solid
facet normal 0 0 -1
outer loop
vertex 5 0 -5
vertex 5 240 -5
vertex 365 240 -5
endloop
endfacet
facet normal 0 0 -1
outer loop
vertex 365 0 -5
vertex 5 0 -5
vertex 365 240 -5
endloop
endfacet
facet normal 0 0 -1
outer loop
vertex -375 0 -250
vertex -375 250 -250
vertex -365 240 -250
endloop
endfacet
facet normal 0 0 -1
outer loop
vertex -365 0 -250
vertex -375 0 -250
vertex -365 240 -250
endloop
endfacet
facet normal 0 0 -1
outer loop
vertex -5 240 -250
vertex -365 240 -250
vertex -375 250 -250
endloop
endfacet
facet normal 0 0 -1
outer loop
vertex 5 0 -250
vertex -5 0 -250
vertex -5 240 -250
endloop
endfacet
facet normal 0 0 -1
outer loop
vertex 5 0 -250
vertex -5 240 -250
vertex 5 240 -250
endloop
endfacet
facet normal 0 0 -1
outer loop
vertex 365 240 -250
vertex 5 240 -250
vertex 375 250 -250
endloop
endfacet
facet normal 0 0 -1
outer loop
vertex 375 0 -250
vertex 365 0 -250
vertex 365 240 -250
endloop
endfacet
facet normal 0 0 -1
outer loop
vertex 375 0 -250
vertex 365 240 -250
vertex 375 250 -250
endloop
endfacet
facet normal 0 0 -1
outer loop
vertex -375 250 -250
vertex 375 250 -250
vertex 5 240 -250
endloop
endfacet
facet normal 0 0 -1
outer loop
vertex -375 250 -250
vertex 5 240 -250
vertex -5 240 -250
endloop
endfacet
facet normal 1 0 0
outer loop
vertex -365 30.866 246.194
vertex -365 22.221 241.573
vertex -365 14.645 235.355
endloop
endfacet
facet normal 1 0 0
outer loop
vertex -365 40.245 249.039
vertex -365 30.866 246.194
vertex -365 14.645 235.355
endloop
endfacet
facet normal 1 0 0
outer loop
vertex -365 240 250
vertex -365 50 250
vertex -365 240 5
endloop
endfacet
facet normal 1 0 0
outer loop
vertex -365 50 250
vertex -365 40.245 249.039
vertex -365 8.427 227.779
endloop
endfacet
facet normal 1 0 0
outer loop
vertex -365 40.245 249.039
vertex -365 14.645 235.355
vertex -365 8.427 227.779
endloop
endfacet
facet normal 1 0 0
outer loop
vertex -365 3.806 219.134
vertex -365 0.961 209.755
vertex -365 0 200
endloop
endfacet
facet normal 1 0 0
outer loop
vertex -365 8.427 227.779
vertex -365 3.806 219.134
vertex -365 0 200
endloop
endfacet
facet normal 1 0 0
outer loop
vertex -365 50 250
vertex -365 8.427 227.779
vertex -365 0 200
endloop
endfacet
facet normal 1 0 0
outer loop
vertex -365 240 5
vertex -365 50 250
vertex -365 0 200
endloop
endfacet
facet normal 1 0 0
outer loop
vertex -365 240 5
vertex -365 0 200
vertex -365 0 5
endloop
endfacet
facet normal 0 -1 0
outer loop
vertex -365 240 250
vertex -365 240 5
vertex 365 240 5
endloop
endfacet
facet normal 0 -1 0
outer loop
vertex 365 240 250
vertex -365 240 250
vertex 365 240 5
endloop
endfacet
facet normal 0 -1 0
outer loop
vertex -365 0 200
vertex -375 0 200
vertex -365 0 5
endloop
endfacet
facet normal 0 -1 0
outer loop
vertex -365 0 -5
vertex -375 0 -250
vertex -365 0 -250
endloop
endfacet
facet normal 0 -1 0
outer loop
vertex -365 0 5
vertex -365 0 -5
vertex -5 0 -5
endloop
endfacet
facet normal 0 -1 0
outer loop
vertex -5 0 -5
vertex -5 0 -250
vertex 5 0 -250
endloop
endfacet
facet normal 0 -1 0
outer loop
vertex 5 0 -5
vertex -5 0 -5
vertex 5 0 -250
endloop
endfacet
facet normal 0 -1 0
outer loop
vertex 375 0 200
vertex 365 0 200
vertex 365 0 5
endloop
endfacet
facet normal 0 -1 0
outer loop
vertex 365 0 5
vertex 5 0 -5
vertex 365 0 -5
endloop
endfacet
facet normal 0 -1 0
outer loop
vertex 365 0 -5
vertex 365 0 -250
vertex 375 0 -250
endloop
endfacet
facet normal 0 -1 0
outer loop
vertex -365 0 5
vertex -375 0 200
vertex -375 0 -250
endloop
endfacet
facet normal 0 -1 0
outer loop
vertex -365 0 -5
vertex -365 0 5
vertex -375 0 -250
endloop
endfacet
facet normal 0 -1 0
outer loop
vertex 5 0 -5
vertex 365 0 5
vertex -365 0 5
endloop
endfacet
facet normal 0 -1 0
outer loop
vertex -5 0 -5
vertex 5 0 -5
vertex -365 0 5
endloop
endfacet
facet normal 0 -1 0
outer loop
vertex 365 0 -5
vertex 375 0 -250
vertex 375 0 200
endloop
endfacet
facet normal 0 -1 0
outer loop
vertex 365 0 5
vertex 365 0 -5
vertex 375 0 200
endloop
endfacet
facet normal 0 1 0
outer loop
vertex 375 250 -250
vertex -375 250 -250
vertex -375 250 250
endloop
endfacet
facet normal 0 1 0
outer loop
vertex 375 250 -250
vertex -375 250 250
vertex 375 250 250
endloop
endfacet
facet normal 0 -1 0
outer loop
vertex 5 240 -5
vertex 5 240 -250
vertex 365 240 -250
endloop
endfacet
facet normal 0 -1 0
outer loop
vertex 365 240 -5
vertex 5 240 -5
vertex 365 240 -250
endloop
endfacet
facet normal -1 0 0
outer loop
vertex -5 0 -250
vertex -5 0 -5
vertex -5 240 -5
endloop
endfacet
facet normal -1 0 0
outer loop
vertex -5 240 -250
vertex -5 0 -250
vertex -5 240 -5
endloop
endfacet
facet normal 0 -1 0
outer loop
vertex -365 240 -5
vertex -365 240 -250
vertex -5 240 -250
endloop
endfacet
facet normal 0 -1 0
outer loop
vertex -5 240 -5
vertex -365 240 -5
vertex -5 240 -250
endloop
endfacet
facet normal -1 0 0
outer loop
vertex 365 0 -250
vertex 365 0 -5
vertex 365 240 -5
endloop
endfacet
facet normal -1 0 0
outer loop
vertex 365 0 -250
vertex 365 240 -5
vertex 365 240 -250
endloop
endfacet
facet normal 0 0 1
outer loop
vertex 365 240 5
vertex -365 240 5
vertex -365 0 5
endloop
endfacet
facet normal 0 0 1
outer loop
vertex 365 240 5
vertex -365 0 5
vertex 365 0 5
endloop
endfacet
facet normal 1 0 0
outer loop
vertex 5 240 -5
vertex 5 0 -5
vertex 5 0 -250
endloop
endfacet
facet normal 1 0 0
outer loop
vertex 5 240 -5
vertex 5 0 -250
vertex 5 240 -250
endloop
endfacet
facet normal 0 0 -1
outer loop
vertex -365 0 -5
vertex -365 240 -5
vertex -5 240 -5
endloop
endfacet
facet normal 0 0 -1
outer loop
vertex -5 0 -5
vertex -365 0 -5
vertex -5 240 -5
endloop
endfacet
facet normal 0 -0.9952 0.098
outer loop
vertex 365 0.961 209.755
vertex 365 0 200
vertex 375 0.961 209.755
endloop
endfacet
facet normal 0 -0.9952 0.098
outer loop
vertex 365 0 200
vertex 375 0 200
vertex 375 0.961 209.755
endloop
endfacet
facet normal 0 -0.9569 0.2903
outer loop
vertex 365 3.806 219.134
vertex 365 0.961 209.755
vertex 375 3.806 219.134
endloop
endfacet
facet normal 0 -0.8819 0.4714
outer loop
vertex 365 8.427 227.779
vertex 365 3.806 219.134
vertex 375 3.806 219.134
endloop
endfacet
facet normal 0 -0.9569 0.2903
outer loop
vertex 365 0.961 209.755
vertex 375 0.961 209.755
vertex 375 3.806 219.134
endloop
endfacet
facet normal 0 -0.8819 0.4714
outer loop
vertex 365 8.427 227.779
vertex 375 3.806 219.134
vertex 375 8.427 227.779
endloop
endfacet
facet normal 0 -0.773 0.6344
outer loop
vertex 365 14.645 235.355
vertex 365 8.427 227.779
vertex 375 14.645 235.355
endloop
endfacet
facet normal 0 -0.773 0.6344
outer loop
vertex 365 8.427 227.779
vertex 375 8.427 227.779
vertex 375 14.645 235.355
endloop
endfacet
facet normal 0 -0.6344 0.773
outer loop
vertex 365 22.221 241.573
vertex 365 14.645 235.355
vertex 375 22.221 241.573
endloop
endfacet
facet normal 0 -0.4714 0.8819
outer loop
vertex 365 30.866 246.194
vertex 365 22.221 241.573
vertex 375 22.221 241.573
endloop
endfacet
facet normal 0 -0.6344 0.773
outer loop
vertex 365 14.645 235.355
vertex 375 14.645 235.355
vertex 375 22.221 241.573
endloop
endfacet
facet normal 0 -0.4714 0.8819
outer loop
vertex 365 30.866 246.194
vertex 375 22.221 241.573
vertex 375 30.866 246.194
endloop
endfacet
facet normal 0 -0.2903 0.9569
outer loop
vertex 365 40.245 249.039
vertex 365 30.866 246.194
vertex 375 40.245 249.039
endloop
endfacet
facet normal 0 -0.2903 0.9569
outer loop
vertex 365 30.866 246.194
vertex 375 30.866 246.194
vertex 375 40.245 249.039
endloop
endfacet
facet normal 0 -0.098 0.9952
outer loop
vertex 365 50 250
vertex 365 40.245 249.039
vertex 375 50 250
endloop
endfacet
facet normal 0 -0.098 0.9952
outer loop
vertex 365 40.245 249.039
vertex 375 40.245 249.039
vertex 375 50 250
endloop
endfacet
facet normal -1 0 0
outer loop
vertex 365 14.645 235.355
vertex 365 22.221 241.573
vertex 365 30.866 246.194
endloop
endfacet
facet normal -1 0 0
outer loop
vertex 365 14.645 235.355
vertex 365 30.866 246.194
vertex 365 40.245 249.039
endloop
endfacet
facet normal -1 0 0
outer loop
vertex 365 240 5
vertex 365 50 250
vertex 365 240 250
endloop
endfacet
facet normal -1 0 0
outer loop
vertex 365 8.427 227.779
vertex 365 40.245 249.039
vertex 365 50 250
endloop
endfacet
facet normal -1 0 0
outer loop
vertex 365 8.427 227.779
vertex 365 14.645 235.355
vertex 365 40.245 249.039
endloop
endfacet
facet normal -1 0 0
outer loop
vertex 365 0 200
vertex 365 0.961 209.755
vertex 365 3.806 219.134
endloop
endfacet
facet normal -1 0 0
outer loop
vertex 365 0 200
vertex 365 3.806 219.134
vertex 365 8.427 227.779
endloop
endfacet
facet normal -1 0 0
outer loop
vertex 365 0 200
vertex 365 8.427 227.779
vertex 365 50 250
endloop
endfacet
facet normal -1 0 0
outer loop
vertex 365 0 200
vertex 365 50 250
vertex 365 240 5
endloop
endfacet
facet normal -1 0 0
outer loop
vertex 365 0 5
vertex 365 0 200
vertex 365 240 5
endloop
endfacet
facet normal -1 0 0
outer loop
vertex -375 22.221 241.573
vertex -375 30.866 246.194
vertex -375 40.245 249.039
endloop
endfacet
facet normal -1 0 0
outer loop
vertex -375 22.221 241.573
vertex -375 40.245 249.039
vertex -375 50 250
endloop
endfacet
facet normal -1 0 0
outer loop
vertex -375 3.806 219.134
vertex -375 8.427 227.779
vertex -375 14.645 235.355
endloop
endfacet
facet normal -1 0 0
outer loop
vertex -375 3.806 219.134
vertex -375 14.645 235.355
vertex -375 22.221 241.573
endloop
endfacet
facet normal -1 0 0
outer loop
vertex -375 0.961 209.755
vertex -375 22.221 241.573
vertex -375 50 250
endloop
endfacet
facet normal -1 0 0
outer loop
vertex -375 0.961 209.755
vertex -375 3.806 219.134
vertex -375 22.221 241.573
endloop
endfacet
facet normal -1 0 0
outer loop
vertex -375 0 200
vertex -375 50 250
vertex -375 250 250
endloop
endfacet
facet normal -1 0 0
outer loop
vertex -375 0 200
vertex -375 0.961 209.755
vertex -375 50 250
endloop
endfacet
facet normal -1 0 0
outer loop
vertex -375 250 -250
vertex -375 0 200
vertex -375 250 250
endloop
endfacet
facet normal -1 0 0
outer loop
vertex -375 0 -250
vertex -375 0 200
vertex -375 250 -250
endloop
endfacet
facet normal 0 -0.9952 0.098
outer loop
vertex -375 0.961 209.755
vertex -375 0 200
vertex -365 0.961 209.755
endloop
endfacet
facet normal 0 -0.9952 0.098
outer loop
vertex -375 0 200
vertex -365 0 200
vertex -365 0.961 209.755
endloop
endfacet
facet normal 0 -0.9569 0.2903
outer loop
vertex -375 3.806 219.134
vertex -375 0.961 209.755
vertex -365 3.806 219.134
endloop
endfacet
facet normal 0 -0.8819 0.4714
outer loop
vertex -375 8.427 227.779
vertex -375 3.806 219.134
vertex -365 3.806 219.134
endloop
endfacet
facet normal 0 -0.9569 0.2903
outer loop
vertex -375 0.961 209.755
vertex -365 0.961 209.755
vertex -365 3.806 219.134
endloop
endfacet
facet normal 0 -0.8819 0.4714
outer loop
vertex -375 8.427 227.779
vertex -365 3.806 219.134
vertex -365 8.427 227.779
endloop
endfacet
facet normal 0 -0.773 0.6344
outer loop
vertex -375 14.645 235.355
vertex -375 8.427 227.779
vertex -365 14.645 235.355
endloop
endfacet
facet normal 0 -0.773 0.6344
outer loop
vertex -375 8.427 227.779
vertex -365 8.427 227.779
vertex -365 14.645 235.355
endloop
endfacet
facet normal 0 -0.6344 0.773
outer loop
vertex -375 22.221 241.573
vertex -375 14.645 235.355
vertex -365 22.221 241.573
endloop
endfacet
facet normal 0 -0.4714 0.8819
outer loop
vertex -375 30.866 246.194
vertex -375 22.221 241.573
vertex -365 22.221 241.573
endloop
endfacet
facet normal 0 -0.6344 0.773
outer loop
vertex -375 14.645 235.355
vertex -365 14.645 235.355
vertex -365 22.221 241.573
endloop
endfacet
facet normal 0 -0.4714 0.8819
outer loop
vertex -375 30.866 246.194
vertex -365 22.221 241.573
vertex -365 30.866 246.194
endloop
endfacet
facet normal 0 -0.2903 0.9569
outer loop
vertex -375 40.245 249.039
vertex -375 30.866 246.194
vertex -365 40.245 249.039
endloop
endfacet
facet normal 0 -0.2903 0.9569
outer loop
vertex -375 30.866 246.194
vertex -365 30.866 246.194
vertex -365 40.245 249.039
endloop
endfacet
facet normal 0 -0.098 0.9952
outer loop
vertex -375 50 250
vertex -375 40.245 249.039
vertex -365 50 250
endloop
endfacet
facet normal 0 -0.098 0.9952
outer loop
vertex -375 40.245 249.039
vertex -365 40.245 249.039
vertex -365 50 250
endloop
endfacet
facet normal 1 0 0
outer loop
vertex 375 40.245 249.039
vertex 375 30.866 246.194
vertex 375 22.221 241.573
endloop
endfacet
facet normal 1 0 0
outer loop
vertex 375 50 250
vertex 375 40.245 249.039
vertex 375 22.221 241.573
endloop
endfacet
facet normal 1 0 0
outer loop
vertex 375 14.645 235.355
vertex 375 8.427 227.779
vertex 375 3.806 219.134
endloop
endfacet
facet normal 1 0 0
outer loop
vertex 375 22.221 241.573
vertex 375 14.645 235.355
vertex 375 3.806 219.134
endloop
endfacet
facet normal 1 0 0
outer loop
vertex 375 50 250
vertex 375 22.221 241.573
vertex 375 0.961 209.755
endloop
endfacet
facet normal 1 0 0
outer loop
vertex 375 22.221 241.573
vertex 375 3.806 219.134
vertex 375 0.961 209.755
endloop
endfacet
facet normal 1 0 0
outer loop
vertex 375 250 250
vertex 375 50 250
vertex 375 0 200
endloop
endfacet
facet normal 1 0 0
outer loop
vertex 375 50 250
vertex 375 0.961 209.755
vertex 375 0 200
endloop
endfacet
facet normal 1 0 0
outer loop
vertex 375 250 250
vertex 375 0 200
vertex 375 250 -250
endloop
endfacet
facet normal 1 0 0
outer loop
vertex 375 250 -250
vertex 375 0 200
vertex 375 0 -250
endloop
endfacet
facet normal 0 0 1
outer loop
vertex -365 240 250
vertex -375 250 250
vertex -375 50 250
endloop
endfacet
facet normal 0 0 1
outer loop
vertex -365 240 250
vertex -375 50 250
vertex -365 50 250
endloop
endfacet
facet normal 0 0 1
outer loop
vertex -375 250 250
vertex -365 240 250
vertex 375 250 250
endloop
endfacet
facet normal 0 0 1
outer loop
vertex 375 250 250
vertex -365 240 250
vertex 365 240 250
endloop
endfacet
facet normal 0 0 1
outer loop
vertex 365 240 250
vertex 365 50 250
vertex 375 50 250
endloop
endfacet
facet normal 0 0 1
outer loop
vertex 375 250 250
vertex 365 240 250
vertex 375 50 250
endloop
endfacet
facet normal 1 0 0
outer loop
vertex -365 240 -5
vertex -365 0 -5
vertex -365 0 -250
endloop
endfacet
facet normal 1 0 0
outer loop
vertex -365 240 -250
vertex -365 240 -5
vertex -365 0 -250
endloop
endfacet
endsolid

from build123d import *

# Parameters (mm, degrees)
F0_W     = 750
F0_H     = 250
F1_DEPTH = 250
F3_T     = -10
F4_W     = 730
F4_H     = 240
F5_DEPTH = 5
F6_R     = 50
F8_W     = 240
F8_H     = 245
F9_DEPTH = 5


# Not quite as in the source:
# - a feature of the source that left no trace in its solid (it failed there, or was rolled back) is left out


with BuildPart() as f1:
    # F0 (on Front) → F1 (new body)
    with BuildSketch(Plane.XZ):
        with Locations((0, 125)):
            Rectangle(F0_W, F0_H)
    extrude(amount=-F1_DEPTH)

    # F2: F1 across plane


with BuildPart() as f1_1:
    add(f1.part)
    add(f1.part.mirror(Plane.XY))

    # F3
    f3_openings = [f1_1.faces().sort_by_distance(p)[0] for p in [
        (0, 0, 0),
        (0, 125, 250),
        (0, 125, -250),
    ]]
    offset(amount=F3_T, openings=f3_openings)

    # F4 (on Top) → F5 (join, symmetric)
    with BuildSketch(Plane.XY):
        with Locations((0, 120)):
            Rectangle(F4_W, F4_H)
    extrude(amount=F5_DEPTH, both=True)

    # F6
    f6_edges = [f1_1.edges().sort_by_distance(p)[0] for p in [
        (-370, 0, 250),
        (370, 0, 250),
    ]]
    fillet(f6_edges, radius=F6_R)

    # F8 (on Right) → F9 (join, symmetric)
    with BuildSketch(Plane.YZ):
        with Locations((120, -127.5)):
            Rectangle(F8_W, F8_H)
    extrude(amount=F9_DEPTH, both=True)


solid = f1_1.part
